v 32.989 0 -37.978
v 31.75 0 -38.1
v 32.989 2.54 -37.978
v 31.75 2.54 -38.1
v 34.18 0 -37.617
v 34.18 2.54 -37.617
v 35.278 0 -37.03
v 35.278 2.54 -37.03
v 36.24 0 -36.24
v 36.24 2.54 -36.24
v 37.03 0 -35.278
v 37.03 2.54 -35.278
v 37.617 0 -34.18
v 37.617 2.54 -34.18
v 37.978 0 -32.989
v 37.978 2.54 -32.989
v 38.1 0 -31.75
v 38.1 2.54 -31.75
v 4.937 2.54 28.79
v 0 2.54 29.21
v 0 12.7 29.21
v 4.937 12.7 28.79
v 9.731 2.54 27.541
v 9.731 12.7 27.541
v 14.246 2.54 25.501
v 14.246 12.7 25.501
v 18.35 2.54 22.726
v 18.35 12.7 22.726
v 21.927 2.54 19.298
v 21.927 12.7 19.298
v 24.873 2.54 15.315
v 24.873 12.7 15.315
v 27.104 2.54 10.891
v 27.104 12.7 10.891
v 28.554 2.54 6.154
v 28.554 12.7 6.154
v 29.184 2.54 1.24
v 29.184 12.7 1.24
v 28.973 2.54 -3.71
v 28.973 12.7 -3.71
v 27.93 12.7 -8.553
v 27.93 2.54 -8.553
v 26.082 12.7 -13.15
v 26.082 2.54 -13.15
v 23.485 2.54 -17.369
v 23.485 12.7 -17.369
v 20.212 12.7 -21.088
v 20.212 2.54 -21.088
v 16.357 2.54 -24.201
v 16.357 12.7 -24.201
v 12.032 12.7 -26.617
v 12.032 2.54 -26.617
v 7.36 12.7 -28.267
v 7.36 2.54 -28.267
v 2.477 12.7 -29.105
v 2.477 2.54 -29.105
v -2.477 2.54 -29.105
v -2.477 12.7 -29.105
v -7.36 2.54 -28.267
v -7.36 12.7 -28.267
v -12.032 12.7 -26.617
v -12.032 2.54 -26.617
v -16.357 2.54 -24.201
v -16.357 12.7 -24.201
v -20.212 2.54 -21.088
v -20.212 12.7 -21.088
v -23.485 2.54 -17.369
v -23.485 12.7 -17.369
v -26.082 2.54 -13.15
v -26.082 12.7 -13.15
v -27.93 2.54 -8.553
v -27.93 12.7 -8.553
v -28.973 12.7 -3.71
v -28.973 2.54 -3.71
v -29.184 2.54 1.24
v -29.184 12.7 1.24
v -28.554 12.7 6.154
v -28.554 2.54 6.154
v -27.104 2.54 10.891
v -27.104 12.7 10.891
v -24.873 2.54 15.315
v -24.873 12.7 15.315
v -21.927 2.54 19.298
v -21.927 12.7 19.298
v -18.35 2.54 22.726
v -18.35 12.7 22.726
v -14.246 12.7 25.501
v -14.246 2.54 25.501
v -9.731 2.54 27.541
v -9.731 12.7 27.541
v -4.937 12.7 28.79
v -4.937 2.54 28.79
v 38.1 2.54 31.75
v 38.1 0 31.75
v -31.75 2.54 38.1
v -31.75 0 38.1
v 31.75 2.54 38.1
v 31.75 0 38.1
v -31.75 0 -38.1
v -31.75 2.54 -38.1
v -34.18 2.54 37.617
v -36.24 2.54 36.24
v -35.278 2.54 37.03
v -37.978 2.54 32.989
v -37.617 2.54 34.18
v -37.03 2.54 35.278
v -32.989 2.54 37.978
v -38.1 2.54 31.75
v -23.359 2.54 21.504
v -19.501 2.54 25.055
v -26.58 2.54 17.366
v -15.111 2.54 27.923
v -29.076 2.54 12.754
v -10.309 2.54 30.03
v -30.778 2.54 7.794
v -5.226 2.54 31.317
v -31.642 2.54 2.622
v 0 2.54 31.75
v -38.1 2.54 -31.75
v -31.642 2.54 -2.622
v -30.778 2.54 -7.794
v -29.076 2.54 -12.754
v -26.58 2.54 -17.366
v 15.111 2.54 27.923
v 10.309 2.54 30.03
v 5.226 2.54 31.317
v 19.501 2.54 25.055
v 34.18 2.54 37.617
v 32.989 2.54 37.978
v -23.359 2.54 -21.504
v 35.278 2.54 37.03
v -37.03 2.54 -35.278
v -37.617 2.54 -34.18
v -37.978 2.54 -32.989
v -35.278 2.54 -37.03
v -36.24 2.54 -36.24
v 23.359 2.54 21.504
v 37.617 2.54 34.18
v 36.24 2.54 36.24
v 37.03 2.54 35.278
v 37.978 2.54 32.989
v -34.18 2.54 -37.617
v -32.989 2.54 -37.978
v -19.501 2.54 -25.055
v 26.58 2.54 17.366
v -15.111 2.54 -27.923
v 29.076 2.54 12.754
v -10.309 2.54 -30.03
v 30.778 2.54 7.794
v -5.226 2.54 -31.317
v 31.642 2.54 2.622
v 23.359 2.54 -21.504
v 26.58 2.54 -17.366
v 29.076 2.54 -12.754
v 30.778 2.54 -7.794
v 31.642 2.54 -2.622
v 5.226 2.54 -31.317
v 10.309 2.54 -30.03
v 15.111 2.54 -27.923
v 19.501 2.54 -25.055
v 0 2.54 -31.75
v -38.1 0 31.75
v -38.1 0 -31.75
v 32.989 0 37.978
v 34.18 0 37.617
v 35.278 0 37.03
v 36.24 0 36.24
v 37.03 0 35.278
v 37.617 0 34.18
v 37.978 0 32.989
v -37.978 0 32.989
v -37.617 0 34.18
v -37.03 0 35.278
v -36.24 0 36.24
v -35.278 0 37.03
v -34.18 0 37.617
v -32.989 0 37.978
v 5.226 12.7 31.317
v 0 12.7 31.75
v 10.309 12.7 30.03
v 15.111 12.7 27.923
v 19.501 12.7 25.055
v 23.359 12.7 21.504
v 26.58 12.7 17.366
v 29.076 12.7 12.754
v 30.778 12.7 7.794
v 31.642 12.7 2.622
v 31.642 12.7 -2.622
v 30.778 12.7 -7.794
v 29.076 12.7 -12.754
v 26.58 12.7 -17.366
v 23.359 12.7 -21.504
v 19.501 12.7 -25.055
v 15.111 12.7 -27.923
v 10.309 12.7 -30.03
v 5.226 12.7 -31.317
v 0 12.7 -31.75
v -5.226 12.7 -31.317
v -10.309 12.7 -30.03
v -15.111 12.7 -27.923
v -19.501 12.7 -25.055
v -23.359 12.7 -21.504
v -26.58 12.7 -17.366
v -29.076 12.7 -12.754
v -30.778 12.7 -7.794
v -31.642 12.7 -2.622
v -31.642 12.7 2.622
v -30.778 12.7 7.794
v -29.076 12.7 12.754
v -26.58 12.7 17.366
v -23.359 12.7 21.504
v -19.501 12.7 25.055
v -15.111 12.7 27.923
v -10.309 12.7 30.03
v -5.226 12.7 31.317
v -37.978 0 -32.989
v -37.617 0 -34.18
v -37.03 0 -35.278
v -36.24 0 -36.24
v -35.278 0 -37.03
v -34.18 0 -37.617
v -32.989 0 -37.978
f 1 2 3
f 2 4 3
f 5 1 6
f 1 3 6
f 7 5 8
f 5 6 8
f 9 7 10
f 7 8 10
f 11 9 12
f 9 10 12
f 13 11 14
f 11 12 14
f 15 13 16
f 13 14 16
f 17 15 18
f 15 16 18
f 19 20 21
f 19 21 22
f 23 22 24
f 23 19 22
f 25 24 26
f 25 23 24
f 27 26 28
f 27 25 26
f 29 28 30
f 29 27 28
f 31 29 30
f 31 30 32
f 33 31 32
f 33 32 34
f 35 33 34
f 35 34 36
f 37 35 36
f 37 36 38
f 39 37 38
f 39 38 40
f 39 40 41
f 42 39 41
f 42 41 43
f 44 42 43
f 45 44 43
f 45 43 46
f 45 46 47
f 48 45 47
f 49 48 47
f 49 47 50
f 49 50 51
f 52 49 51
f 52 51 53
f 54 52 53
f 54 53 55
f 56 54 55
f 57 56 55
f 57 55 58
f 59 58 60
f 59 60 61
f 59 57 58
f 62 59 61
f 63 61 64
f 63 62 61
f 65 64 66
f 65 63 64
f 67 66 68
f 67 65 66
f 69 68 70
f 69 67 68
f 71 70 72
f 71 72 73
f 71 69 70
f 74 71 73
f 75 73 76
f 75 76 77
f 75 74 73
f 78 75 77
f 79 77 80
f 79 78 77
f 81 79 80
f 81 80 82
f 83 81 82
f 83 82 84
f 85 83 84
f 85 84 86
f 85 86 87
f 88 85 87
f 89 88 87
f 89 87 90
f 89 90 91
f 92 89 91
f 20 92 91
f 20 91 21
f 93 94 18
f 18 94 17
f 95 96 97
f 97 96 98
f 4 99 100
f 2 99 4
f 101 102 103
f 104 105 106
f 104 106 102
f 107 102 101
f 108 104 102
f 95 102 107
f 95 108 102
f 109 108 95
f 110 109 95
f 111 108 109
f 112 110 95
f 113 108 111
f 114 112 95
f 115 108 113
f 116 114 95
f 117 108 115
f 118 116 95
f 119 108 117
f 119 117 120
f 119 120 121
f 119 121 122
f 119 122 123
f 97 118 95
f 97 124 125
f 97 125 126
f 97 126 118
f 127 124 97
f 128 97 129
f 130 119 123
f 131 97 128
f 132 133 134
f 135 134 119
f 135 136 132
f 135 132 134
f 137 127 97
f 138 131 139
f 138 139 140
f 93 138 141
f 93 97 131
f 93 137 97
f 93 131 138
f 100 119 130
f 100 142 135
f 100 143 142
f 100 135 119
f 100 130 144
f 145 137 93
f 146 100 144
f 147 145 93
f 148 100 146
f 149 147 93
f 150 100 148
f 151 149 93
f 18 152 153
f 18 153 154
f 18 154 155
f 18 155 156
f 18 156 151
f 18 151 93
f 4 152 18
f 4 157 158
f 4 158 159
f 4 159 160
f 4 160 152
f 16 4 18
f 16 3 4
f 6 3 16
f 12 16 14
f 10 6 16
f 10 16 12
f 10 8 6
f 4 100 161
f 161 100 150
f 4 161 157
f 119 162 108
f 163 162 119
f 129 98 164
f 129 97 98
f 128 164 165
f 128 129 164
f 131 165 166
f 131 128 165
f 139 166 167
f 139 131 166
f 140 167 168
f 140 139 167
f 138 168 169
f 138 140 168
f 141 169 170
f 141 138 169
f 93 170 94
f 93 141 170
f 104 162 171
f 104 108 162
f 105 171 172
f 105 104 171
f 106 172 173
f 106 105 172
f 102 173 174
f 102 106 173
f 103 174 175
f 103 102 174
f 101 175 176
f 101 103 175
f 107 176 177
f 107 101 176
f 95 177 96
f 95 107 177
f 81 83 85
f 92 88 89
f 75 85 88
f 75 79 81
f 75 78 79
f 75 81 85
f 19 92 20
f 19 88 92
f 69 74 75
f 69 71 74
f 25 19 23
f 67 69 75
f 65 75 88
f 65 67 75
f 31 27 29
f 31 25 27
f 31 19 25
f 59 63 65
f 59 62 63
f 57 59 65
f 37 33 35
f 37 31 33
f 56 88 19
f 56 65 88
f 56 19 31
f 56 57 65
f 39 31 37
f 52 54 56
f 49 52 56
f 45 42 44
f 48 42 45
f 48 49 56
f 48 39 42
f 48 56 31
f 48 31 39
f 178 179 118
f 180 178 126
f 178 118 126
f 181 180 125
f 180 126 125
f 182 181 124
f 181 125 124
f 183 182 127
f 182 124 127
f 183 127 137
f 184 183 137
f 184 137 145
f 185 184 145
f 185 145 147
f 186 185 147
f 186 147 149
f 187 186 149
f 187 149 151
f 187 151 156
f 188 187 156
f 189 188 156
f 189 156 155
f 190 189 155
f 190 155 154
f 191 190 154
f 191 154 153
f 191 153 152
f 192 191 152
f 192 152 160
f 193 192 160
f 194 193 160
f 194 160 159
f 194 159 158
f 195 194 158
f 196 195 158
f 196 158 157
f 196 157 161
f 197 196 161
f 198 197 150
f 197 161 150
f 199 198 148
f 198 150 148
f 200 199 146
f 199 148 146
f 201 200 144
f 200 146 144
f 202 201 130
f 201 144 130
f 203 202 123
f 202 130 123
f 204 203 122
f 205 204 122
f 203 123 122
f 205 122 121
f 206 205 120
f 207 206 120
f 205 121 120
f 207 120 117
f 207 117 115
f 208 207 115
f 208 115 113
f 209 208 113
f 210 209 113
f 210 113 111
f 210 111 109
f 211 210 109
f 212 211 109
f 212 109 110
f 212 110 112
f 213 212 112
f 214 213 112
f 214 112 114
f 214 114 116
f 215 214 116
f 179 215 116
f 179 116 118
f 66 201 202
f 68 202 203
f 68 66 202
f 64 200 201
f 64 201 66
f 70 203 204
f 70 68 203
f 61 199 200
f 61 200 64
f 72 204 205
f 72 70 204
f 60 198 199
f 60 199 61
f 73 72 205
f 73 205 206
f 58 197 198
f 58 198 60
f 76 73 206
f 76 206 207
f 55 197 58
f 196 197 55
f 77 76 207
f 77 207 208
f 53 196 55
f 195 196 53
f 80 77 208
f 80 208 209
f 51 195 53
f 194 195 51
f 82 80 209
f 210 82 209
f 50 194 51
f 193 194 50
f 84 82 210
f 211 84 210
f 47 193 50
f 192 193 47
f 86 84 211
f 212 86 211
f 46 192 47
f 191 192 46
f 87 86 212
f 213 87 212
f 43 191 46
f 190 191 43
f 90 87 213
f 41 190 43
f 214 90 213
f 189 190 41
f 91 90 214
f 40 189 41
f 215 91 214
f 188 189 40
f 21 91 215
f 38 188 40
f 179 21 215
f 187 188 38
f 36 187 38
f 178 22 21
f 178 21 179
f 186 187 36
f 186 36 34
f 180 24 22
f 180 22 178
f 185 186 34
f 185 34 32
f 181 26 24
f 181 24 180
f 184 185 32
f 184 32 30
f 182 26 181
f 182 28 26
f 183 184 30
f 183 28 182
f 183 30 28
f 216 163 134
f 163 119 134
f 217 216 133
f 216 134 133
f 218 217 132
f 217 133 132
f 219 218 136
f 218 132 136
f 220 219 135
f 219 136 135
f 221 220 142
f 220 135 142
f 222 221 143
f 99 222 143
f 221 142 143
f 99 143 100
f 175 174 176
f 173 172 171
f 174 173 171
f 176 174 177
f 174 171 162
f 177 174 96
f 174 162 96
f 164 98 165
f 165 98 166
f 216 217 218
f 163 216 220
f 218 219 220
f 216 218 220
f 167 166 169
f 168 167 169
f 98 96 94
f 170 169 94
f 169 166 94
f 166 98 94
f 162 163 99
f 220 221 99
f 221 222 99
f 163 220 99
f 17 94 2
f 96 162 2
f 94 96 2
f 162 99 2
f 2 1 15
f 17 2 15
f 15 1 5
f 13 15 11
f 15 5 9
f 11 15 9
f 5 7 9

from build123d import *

# Parameters (mm, degrees)
SKETCH1_R           = 31.75
SKETCH1_R_2         = 29.21
BOSS_EXTRUDE1_DEPTH = 12.7
SKETCH2_W           = 76.2
SKETCH2_H           = 76.2
BOSS_EXTRUDE2_DEPTH = 2.54
FILLET1_R           = 6.35


with BuildPart() as part:
    # Sketch1 → Boss-Extrude1 (new body)
    with BuildSketch(Plane(origin=(0, 0, 0), x_dir=(1, 0, 0), z_dir=(0, 1, 0))):
        with Locations(Location((0, 0, 0), (0, 0, 270))):
            Circle(SKETCH1_R)
        with Locations(Location((0, 0, 0), (0, 0, 270))):
            Circle(SKETCH1_R_2, mode=Mode.SUBTRACT)
    extrude(amount=BOSS_EXTRUDE1_DEPTH)

    # Sketch2 → Boss-Extrude2 (add)
    with BuildSketch(Plane(origin=(0, 0, 0), x_dir=(1, 0, 0), z_dir=(0, 1, 0))):
        Rectangle(SKETCH2_W, SKETCH2_H)
    extrude(amount=BOSS_EXTRUDE2_DEPTH)

    # Fillet1
    fillet1_edges = [part.edges().sort_by_distance(p)[0] for p in [
        (38.1, 1.27, 38.1),
        (38.1, 1.27, -38.1),
        (-38.1, 1.27, -38.1),
        (-38.1, 1.27, 38.1),
    ]]
    fillet(fillet1_edges, radius=FILLET1_R)


solid = part.part
